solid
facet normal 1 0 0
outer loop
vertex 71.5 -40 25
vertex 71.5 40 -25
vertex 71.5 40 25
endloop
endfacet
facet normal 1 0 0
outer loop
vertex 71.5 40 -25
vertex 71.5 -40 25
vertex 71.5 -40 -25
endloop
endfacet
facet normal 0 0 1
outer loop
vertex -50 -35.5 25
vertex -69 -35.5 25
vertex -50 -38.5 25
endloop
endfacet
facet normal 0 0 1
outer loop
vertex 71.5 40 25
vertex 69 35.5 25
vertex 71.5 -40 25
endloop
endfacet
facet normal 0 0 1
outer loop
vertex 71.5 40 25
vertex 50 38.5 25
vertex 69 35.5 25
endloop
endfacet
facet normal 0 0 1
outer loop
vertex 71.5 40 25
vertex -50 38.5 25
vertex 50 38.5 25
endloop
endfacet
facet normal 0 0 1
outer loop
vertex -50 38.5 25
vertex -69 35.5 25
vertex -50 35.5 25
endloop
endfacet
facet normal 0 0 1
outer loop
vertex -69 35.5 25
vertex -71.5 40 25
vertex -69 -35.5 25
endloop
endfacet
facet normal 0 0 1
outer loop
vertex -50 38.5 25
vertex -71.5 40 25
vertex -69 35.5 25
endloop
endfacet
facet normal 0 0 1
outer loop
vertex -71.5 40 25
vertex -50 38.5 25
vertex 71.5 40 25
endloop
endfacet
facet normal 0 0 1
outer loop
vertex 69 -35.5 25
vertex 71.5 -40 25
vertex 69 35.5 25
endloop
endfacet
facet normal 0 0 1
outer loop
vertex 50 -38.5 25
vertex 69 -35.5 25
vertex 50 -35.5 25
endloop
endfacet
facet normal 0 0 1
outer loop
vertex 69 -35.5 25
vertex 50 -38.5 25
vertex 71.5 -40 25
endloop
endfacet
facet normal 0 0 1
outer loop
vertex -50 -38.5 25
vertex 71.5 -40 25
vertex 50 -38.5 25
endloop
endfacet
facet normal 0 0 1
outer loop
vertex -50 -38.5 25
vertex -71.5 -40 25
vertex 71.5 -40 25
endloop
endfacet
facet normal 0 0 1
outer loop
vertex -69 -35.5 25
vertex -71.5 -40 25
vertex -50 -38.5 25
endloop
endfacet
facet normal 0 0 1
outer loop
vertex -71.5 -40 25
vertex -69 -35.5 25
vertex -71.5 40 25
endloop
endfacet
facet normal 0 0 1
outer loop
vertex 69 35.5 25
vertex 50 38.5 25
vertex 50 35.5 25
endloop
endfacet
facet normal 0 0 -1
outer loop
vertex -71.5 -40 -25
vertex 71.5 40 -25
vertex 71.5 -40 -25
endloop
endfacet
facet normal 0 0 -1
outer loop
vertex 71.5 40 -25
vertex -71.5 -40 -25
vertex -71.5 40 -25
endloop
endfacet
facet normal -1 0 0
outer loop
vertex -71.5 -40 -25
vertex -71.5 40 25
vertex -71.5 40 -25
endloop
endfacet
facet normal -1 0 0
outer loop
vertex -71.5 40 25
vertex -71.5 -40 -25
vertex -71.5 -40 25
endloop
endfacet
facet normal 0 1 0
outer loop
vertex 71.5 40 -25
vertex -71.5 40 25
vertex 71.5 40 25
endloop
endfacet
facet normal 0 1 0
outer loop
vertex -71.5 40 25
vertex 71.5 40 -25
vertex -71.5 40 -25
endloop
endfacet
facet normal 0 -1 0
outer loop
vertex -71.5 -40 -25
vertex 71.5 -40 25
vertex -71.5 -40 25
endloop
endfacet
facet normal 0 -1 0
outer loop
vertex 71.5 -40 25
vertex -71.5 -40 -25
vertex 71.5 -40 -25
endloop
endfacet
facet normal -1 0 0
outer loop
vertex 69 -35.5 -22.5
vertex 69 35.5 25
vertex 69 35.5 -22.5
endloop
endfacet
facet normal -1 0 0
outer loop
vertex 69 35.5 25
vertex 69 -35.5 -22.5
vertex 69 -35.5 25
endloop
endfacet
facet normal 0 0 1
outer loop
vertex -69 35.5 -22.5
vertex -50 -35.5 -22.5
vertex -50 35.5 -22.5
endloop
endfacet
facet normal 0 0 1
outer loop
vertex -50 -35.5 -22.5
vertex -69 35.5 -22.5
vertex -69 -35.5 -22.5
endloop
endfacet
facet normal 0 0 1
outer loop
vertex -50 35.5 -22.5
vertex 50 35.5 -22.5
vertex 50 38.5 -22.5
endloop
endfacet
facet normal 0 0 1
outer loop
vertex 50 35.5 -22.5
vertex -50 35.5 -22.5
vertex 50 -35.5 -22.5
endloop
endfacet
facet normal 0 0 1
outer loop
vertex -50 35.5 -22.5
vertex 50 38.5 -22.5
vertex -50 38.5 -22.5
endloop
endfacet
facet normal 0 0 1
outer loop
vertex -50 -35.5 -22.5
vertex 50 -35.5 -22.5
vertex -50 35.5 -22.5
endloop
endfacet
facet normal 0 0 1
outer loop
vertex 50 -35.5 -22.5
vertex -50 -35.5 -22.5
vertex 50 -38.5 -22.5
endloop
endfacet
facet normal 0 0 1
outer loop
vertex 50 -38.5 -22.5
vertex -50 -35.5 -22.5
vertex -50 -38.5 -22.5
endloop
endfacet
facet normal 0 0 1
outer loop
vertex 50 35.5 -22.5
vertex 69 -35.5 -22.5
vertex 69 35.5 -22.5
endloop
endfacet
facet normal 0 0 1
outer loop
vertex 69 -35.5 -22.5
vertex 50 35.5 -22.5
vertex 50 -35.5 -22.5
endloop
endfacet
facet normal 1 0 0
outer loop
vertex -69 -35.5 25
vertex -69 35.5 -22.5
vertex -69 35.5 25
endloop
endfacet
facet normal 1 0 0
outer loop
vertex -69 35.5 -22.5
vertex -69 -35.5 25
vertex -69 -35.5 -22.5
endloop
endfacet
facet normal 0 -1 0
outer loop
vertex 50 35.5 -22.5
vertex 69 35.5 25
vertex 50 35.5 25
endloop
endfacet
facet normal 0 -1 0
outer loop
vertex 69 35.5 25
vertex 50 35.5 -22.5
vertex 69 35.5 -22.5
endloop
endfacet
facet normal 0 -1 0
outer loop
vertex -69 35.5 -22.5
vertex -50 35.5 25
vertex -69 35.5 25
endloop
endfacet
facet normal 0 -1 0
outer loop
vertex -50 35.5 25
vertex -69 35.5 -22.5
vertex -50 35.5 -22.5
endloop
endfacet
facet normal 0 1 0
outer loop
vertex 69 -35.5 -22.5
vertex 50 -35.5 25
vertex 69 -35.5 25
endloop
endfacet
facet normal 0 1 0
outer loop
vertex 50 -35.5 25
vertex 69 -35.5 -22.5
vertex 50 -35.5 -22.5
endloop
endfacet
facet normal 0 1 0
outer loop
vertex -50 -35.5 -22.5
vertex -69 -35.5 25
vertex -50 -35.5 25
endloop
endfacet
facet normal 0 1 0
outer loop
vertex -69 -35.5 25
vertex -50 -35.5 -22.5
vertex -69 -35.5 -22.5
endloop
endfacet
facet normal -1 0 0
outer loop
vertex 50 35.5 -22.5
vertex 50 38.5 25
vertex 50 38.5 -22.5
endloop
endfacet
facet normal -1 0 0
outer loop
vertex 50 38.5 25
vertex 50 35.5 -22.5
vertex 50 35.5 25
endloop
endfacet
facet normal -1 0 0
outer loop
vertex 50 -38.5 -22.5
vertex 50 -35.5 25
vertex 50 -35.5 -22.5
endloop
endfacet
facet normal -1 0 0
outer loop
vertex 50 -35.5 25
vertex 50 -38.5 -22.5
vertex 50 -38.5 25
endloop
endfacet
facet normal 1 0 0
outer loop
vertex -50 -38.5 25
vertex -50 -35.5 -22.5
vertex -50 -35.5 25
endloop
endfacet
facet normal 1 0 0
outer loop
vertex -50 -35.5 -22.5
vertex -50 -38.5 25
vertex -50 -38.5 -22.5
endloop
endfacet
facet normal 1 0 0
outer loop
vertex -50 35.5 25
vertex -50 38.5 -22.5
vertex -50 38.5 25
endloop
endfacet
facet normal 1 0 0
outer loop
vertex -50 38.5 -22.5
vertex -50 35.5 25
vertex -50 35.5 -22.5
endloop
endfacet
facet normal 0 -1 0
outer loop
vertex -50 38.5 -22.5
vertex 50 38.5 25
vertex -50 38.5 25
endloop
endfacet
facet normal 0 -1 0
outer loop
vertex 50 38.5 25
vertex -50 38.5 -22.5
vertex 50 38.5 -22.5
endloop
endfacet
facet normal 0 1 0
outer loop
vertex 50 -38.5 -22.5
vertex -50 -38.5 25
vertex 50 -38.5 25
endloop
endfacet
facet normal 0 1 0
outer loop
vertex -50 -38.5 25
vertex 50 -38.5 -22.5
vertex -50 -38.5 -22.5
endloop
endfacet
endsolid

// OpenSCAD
scale([1, 1]) difference() {
    cube(([143,80,50]), center = true);
    translate([0, 0, 3])
        cube(([138,71,51]), center = true);
     translate([0, 0, 3])
        cube(([100,77,51]), center = true);   }
